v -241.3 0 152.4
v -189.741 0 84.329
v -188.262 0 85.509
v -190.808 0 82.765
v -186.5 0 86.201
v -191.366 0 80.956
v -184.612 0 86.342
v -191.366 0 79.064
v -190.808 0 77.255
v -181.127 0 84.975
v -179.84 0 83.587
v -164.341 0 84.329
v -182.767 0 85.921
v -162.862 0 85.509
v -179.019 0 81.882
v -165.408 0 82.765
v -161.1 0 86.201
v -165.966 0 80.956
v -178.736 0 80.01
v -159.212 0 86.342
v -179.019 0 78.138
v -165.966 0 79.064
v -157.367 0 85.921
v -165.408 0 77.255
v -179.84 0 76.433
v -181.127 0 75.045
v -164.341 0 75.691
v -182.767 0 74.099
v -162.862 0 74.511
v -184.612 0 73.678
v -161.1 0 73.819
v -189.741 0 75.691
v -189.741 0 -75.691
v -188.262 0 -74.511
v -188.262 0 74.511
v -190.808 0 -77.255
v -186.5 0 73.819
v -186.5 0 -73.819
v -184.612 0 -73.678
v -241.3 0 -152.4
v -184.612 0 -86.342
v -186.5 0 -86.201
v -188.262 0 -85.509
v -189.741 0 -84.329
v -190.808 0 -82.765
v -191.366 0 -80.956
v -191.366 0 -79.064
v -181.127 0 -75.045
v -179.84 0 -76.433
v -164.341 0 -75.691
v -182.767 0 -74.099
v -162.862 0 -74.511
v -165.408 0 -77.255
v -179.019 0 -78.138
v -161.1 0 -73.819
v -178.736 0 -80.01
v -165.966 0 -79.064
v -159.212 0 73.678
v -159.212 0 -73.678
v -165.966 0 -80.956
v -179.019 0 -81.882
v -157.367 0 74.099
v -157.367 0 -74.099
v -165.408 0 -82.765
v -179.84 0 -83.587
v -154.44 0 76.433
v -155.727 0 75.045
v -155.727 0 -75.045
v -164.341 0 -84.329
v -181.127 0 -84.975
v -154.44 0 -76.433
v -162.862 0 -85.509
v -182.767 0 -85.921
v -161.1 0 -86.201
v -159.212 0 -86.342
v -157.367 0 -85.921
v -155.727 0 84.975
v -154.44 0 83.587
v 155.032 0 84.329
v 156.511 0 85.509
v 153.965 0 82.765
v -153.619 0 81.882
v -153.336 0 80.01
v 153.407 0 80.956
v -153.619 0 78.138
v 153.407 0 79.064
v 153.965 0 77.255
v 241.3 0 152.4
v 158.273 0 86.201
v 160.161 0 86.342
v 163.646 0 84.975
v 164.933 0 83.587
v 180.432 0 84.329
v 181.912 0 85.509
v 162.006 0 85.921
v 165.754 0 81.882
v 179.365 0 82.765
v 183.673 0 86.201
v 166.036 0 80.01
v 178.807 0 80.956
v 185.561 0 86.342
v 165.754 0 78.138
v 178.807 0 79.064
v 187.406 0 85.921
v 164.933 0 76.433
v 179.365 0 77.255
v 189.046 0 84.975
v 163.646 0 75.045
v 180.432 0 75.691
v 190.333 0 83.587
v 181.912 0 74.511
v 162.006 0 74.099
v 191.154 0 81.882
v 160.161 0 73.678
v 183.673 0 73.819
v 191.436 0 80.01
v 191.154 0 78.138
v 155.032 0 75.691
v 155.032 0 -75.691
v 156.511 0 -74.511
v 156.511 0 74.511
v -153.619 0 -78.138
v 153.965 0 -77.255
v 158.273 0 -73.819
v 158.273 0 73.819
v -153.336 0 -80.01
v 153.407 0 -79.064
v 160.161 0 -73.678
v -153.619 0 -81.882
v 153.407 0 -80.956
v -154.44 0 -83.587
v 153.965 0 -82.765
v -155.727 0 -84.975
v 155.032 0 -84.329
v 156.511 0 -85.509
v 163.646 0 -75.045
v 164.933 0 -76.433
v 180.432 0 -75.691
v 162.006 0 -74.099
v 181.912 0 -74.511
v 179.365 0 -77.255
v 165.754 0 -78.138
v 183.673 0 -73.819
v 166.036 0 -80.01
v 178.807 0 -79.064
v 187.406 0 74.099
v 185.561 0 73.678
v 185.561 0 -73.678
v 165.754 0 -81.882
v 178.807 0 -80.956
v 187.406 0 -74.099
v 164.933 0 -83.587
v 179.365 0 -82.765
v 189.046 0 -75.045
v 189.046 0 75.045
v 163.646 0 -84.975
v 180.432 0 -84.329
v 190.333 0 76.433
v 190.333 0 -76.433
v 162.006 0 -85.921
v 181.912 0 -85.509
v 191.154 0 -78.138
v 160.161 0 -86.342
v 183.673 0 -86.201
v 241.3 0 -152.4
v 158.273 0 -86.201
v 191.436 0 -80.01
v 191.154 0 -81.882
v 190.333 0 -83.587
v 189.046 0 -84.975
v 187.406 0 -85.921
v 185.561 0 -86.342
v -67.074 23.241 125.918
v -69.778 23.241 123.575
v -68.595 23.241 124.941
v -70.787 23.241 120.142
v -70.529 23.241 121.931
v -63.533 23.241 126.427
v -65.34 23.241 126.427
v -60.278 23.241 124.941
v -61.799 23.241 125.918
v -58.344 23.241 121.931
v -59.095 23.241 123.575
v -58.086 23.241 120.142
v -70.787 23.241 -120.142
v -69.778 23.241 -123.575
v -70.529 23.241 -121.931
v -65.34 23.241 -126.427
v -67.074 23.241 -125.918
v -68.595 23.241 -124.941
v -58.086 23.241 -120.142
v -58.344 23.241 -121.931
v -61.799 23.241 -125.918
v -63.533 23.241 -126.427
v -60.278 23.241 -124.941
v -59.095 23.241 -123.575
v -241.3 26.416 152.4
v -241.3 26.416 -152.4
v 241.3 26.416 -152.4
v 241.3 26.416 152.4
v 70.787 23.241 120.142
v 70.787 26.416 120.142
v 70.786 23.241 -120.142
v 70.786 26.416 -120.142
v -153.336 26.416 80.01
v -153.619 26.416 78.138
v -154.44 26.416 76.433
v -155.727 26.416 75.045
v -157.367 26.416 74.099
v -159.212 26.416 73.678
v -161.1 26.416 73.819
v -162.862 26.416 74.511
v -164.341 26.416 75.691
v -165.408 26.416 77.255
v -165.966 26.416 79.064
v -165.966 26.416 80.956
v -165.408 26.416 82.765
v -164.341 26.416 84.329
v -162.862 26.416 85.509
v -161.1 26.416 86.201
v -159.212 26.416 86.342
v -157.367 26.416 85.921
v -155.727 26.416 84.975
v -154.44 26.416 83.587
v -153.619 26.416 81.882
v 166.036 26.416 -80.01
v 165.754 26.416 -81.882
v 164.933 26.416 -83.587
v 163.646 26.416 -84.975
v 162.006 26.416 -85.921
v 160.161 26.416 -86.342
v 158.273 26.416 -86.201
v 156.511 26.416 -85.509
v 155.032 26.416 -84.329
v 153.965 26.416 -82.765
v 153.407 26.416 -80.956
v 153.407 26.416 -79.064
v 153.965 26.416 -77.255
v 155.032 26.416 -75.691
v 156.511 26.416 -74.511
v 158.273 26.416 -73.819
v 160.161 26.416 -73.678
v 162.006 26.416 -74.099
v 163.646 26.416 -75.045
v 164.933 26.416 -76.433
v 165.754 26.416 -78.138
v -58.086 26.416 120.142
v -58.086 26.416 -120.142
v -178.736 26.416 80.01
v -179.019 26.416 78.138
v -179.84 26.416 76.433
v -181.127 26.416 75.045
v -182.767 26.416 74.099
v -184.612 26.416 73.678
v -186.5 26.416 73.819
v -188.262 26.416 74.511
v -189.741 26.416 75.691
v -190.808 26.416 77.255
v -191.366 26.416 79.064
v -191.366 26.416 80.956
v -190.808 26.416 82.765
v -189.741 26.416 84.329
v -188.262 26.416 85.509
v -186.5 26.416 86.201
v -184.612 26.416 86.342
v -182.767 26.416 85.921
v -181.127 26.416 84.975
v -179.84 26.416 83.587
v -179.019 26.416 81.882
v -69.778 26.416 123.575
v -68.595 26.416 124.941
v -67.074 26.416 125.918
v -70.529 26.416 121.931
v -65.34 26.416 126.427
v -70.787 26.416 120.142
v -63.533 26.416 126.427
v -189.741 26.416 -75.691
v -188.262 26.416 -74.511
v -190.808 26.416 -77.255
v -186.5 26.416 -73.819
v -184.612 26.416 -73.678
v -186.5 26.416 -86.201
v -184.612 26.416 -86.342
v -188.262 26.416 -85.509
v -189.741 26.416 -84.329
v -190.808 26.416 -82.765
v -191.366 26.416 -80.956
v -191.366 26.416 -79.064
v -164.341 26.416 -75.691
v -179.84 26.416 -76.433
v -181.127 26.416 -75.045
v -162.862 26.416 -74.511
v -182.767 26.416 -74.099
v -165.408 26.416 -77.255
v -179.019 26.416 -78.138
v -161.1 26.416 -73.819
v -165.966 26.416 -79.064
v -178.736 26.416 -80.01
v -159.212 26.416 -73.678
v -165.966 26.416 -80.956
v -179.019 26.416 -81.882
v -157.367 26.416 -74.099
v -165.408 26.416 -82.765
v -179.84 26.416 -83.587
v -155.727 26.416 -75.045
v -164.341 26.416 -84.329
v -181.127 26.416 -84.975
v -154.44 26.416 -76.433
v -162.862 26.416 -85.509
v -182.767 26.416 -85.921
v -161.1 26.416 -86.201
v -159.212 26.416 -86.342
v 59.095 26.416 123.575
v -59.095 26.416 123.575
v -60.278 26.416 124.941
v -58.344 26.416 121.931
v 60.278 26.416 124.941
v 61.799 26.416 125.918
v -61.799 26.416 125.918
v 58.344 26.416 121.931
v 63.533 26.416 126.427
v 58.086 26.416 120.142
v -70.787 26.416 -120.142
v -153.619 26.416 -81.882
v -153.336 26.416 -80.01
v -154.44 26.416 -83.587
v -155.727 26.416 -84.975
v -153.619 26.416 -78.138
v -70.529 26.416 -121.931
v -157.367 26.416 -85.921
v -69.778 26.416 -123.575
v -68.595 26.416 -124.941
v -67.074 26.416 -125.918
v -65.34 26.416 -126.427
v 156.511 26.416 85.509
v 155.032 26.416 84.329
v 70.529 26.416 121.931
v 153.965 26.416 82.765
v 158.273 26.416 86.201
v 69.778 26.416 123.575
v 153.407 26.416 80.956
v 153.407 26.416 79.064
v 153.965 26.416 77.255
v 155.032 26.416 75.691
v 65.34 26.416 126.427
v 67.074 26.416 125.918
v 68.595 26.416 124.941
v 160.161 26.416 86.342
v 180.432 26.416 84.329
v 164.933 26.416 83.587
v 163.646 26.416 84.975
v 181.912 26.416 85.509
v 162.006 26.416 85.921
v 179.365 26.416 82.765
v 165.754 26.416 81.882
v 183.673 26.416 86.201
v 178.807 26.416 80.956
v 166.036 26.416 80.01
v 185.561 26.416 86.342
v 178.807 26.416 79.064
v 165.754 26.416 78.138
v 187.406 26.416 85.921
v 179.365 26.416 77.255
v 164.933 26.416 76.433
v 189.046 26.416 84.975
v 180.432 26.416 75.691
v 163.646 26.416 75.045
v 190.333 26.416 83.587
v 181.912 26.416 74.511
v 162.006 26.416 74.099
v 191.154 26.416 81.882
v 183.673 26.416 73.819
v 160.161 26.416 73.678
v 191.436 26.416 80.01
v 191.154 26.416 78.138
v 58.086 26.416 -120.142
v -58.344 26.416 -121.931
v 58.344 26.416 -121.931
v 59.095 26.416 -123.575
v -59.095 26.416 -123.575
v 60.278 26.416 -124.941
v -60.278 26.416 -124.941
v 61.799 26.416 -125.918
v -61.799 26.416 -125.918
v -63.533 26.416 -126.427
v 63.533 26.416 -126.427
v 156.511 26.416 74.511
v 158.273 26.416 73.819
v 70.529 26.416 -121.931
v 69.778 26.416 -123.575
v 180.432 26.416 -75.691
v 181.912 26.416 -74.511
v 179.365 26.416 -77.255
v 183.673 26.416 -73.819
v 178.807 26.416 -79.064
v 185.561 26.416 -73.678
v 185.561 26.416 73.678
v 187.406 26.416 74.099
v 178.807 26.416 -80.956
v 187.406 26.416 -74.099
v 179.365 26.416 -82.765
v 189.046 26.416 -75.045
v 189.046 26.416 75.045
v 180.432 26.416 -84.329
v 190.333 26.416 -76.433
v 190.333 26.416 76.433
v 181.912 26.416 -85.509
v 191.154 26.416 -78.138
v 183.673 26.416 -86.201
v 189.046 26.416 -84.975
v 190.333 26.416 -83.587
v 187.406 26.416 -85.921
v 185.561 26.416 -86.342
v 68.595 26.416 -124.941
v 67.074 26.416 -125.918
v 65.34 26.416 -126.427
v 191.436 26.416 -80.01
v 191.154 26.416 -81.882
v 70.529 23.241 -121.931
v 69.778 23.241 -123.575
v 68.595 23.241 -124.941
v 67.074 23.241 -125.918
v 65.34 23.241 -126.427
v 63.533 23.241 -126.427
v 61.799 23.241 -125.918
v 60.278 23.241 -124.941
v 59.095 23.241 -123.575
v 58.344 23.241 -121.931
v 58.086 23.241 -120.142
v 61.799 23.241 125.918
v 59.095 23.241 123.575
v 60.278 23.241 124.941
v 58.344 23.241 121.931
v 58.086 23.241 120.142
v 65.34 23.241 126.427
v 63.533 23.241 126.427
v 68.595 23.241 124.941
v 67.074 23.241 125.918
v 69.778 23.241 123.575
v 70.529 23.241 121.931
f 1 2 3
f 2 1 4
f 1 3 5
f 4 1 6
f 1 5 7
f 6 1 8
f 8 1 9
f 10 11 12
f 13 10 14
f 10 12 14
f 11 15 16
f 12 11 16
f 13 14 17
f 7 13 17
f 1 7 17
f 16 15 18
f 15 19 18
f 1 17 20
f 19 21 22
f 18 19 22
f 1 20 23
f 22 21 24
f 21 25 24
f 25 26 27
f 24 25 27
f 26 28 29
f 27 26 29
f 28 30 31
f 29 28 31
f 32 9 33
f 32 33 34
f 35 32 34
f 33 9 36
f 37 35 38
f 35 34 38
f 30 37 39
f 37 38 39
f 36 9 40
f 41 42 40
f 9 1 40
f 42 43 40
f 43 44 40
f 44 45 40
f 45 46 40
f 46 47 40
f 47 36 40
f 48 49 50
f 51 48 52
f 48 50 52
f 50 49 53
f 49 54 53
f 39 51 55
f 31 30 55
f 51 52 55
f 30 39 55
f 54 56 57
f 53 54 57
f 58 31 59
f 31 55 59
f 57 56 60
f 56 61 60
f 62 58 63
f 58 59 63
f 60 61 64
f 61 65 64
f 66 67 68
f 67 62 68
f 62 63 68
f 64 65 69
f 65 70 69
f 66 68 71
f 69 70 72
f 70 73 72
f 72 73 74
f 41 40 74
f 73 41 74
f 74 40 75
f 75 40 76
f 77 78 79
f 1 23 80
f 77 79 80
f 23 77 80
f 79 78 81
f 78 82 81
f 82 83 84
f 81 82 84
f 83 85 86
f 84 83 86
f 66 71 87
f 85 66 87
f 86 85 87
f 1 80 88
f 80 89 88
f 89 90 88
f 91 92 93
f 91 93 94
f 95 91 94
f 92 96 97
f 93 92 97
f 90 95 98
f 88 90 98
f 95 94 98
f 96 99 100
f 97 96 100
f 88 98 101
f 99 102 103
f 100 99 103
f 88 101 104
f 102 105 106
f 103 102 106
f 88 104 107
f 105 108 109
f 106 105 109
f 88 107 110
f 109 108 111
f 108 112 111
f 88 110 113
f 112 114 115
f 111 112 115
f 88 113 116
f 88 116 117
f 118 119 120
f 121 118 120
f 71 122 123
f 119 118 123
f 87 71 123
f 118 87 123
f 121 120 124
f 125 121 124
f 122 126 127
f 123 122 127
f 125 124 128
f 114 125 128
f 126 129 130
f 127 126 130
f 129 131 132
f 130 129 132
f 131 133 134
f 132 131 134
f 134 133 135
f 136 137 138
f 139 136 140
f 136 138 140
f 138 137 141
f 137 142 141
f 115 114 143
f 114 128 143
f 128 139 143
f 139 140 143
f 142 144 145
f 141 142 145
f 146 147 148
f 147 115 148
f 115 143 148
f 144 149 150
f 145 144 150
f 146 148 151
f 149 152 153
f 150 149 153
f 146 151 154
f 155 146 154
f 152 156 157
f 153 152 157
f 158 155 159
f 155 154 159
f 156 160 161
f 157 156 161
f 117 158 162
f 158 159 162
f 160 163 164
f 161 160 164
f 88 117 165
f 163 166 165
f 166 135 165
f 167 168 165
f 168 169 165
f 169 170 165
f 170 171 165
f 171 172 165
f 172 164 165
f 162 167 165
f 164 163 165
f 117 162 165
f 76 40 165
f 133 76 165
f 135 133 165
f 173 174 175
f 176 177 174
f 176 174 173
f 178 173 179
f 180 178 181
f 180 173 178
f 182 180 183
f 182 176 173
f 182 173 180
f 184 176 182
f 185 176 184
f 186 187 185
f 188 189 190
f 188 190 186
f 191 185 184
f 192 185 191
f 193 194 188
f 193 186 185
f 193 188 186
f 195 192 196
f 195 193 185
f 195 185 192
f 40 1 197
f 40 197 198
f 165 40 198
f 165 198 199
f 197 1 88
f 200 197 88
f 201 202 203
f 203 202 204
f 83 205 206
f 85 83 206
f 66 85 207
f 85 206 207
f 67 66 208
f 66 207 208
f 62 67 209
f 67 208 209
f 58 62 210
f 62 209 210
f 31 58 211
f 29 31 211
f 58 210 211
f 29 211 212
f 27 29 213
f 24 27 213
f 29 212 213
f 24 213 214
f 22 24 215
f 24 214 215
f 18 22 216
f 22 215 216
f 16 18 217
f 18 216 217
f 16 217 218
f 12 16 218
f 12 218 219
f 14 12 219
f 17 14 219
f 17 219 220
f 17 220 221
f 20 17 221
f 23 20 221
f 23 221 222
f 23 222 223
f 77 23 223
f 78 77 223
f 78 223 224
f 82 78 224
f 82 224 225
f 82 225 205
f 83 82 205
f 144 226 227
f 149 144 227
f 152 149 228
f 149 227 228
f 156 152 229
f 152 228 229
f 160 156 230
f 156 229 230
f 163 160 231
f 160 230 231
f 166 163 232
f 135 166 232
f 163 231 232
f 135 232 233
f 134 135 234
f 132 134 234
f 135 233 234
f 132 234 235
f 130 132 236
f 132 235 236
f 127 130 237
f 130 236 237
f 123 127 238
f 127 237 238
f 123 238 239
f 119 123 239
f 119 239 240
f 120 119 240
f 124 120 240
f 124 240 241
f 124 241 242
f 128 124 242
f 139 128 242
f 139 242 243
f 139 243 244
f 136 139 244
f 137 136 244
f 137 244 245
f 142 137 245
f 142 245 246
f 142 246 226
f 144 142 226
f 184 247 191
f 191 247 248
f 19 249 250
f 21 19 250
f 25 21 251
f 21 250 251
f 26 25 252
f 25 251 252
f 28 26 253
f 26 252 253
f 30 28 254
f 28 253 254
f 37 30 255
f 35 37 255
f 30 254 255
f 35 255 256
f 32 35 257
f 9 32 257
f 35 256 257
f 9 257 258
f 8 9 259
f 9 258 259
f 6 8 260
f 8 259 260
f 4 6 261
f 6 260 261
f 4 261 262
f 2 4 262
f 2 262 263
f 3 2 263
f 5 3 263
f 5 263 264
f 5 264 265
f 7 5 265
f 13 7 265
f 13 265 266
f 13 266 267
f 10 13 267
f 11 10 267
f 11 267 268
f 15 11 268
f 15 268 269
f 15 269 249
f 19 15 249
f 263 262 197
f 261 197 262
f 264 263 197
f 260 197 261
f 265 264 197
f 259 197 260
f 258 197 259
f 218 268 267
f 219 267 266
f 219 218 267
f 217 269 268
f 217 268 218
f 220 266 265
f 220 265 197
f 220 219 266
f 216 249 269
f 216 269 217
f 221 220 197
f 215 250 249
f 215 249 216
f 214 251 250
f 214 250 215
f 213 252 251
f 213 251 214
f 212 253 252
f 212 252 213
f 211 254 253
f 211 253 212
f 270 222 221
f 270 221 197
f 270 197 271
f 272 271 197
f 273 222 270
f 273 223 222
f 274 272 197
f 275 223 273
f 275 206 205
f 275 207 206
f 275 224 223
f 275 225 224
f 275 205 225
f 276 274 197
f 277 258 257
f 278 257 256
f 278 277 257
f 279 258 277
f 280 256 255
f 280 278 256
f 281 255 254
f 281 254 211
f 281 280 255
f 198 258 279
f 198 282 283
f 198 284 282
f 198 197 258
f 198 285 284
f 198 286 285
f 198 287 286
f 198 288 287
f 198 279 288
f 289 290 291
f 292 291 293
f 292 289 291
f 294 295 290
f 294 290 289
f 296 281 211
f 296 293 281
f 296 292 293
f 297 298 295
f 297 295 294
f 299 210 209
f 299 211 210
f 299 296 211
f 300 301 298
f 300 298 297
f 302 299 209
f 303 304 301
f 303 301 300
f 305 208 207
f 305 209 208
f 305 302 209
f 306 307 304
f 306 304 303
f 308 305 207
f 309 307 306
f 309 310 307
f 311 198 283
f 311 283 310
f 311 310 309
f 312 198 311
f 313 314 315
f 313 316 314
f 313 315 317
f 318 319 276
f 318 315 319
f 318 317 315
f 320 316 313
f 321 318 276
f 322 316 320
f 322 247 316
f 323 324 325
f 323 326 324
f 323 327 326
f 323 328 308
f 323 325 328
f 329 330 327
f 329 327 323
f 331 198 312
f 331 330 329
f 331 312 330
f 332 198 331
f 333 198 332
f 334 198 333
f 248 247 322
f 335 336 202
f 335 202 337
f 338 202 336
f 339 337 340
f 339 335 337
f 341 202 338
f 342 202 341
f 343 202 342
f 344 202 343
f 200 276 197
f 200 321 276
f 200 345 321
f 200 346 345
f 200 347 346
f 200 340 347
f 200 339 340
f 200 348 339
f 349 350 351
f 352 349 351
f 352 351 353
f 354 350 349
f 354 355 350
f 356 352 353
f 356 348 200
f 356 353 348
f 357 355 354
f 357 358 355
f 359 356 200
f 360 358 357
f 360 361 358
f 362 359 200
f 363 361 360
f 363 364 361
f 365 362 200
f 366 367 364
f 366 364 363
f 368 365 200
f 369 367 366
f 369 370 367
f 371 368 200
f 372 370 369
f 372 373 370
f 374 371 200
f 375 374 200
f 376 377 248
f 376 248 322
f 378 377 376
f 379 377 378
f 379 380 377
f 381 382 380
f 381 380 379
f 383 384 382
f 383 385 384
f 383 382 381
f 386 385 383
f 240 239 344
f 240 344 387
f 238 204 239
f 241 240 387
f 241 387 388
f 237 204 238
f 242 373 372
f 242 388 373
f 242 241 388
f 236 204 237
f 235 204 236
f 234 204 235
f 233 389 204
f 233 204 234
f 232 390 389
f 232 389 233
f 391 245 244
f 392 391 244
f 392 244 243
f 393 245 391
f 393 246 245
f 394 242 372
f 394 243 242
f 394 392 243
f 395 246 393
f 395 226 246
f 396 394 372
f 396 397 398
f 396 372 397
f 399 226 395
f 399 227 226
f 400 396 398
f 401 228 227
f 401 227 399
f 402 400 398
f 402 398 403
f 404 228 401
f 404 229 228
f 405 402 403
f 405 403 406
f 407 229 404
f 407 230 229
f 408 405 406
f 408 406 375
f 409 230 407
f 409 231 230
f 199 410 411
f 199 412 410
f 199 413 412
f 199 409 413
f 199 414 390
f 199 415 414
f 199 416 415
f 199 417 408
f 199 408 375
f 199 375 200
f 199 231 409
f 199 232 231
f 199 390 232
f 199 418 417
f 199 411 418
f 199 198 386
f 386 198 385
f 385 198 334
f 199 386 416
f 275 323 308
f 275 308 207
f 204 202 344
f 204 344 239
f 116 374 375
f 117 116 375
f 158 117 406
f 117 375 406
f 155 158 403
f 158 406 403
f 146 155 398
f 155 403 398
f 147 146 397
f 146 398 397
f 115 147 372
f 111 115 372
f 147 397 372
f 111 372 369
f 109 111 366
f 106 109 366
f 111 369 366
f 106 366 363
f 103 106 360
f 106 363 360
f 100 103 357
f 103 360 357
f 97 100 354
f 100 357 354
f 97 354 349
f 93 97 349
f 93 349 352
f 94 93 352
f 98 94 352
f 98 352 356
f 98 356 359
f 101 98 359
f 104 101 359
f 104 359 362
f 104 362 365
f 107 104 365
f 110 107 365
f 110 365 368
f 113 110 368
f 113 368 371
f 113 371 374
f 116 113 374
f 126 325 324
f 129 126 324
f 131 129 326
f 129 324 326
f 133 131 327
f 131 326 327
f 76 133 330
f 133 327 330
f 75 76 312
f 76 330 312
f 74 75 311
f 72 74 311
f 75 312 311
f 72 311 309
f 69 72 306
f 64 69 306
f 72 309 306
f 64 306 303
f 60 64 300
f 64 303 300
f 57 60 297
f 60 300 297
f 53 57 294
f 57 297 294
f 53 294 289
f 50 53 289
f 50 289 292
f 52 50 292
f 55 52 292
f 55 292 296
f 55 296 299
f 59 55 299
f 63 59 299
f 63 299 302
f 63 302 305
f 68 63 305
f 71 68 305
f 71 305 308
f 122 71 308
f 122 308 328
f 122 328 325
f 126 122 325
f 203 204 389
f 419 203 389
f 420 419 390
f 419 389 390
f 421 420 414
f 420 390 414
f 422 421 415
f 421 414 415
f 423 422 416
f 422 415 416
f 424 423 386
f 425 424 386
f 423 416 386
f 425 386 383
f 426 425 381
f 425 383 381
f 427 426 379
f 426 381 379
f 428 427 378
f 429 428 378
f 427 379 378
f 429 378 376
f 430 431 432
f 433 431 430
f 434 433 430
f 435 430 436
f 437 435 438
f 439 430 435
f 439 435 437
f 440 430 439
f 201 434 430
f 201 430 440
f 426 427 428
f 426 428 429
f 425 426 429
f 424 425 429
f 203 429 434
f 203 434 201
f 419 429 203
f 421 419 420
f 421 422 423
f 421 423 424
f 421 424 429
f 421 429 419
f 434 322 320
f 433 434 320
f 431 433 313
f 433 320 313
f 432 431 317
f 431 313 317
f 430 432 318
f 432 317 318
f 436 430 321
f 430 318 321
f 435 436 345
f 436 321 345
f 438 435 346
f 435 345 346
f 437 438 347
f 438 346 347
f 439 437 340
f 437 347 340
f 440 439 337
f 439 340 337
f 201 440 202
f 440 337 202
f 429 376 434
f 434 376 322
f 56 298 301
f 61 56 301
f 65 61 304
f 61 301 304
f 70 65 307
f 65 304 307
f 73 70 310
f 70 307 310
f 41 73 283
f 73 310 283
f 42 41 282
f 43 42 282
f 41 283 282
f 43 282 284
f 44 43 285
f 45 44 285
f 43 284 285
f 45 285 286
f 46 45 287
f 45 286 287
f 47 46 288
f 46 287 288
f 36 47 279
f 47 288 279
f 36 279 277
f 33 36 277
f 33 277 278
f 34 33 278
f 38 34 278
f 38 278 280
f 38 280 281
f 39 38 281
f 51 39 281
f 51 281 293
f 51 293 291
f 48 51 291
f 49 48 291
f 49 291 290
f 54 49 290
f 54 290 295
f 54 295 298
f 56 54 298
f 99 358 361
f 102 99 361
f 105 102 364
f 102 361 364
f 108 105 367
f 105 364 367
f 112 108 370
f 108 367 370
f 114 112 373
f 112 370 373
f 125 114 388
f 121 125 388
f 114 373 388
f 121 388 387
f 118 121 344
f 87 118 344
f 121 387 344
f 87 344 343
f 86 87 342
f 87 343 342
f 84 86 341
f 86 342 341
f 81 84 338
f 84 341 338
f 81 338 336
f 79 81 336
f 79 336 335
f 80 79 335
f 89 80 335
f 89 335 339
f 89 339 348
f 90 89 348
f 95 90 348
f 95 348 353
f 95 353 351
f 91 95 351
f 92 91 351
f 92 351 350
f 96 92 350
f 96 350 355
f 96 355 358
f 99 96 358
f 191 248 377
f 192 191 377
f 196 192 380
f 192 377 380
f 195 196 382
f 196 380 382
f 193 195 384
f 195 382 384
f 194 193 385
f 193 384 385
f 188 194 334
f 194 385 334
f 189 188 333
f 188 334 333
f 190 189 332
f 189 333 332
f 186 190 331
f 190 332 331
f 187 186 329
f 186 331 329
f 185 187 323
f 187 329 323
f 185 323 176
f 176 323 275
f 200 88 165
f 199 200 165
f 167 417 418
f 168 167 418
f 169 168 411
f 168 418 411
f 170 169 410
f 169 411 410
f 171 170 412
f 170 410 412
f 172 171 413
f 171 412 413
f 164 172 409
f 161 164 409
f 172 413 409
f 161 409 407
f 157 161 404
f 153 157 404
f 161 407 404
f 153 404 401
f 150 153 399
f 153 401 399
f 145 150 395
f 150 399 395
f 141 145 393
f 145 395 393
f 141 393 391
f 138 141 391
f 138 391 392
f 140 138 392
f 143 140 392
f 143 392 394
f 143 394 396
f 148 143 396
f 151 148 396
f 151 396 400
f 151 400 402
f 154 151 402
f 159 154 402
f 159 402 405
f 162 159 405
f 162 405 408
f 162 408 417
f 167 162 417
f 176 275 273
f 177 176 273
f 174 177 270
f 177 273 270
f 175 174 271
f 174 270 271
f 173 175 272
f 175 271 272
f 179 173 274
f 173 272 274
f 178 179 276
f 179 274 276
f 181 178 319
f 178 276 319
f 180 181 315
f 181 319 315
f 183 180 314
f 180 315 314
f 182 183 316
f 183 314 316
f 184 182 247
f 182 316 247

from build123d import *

# Parameters (mm, degrees)
SKETCH1_W           = 482.6
SKETCH1_H           = 304.8
BOSS_EXTRUDE1_DEPTH = 26.416
CUT_EXTRUDE3_DEPTH  = 3.175
SKETCH3_R           = 6.35
CUT_EXTRUDE2_DEPTH  = 27.416


with BuildPart() as part:
    # Sketch1 → Boss-Extrude1 (new body)
    with BuildSketch(Plane(origin=(0, 0, 0), x_dir=(1, 0, 0), z_dir=(0, 1, 0))):
        Rectangle(SKETCH1_W, SKETCH1_H)
    extrude(amount=BOSS_EXTRUDE1_DEPTH)

    # Sketch2 → Cut-Extrude3 (cut)
    with BuildSketch(Plane(origin=(0, 26.416, 0), x_dir=(1, 0, 0), z_dir=(0, 1, 0))):
        with BuildLine():
            Line((-70.7865, 120.142), (-70.7865, -120.142))
            ThreePointArc((-70.7865, -120.142), (-64.4365, -113.792), (-58.0865, -120.142))
            Line((-58.0865, -120.142), (-58.0865, 120.142))
            ThreePointArc((-58.0865, 120.142), (-64.4365, 113.792), (-70.7865, 120.142))
        make_face()
        with BuildLine():
            ThreePointArc((-58.0865, 120.142), (-64.4365, 126.492), (-70.7865, 120.142))
            Line((-70.7865, 120.142), (-58.0865, 120.142))
        make_face()
        with BuildLine():
            Line((-58.0865, 120.142), (-70.7865, 120.142))
            ThreePointArc((-70.7865, 120.142), (-64.4365, 113.792), (-58.0865, 120.142))
        make_face()
        with BuildLine():
            ThreePointArc((-58.0865, -120.142), (-64.4365, -113.792), (-70.7865, -120.142))
            Line((-70.7865, -120.142), (-58.0865, -120.142))
        make_face()
        with BuildLine():
            Line((-58.0865, -120.142), (-70.7865, -120.142))
            ThreePointArc((-70.7865, -120.142), (-64.4365, -126.492), (-58.0865, -120.142))
        make_face()
        with BuildLine():
            ThreePointArc((58.0865, 120.142), (64.4365, 113.792), (70.7865, 120.142))
            Line((70.7865, 120.142), (58.0865, 120.142))
        make_face()
        with BuildLine():
            Line((58.0865, 120.142), (70.7865, 120.142))
            ThreePointArc((70.7865, 120.142), (64.4365, 126.492), (58.0865, 120.142))
        make_face()
        with BuildLine():
            Line((70.7865, -120.142), (70.7865, 120.142))
            ThreePointArc((70.7865, 120.142), (64.4365, 113.792), (58.0865, 120.142))
            Line((58.0865, 120.142), (58.0865, -120.142))
            ThreePointArc((58.0865, -120.142), (64.4365, -113.792), (70.7865, -120.142))
        make_face()
        with BuildLine():
            ThreePointArc((58.0865, -120.142), (64.4365, -126.492), (70.7865, -120.142))
            Line((70.7865, -120.142), (58.0865, -120.142))
        make_face()
        with BuildLine():
            Line((58.0865, -120.142), (70.7865, -120.142))
            ThreePointArc((70.7865, -120.142), (64.4365, -113.792), (58.0865, -120.142))
        make_face()
    extrude(amount=-CUT_EXTRUDE3_DEPTH, mode=Mode.SUBTRACT)

    # Sketch3 → Cut-Extrude2 (cut, through all)
    with BuildSketch(Plane(origin=(0, 26.416, 0), x_dir=(1, 0, 0), z_dir=(0, 1, 0))):
        with Locations((-185.0865, -80.01)):
            Circle(SKETCH3_R)
        with Locations((-159.6865, -80.01)):
            Circle(SKETCH3_R)
        with Locations((-159.6865, 80.01)):
            Circle(SKETCH3_R)
        with Locations((-185.0865, 80.01)):
            Circle(SKETCH3_R)
        with Locations((159.6865, -80.01)):
            Circle(SKETCH3_R)
        with Locations((185.0865, -80.01)):
            Circle(SKETCH3_R)
        with Locations((159.6865, 80.01)):
            Circle(SKETCH3_R)
        with Locations((185.0865, 80.01)):
            Circle(SKETCH3_R)
    extrude(amount=-CUT_EXTRUDE2_DEPTH, mode=Mode.SUBTRACT)


solid = part.part
